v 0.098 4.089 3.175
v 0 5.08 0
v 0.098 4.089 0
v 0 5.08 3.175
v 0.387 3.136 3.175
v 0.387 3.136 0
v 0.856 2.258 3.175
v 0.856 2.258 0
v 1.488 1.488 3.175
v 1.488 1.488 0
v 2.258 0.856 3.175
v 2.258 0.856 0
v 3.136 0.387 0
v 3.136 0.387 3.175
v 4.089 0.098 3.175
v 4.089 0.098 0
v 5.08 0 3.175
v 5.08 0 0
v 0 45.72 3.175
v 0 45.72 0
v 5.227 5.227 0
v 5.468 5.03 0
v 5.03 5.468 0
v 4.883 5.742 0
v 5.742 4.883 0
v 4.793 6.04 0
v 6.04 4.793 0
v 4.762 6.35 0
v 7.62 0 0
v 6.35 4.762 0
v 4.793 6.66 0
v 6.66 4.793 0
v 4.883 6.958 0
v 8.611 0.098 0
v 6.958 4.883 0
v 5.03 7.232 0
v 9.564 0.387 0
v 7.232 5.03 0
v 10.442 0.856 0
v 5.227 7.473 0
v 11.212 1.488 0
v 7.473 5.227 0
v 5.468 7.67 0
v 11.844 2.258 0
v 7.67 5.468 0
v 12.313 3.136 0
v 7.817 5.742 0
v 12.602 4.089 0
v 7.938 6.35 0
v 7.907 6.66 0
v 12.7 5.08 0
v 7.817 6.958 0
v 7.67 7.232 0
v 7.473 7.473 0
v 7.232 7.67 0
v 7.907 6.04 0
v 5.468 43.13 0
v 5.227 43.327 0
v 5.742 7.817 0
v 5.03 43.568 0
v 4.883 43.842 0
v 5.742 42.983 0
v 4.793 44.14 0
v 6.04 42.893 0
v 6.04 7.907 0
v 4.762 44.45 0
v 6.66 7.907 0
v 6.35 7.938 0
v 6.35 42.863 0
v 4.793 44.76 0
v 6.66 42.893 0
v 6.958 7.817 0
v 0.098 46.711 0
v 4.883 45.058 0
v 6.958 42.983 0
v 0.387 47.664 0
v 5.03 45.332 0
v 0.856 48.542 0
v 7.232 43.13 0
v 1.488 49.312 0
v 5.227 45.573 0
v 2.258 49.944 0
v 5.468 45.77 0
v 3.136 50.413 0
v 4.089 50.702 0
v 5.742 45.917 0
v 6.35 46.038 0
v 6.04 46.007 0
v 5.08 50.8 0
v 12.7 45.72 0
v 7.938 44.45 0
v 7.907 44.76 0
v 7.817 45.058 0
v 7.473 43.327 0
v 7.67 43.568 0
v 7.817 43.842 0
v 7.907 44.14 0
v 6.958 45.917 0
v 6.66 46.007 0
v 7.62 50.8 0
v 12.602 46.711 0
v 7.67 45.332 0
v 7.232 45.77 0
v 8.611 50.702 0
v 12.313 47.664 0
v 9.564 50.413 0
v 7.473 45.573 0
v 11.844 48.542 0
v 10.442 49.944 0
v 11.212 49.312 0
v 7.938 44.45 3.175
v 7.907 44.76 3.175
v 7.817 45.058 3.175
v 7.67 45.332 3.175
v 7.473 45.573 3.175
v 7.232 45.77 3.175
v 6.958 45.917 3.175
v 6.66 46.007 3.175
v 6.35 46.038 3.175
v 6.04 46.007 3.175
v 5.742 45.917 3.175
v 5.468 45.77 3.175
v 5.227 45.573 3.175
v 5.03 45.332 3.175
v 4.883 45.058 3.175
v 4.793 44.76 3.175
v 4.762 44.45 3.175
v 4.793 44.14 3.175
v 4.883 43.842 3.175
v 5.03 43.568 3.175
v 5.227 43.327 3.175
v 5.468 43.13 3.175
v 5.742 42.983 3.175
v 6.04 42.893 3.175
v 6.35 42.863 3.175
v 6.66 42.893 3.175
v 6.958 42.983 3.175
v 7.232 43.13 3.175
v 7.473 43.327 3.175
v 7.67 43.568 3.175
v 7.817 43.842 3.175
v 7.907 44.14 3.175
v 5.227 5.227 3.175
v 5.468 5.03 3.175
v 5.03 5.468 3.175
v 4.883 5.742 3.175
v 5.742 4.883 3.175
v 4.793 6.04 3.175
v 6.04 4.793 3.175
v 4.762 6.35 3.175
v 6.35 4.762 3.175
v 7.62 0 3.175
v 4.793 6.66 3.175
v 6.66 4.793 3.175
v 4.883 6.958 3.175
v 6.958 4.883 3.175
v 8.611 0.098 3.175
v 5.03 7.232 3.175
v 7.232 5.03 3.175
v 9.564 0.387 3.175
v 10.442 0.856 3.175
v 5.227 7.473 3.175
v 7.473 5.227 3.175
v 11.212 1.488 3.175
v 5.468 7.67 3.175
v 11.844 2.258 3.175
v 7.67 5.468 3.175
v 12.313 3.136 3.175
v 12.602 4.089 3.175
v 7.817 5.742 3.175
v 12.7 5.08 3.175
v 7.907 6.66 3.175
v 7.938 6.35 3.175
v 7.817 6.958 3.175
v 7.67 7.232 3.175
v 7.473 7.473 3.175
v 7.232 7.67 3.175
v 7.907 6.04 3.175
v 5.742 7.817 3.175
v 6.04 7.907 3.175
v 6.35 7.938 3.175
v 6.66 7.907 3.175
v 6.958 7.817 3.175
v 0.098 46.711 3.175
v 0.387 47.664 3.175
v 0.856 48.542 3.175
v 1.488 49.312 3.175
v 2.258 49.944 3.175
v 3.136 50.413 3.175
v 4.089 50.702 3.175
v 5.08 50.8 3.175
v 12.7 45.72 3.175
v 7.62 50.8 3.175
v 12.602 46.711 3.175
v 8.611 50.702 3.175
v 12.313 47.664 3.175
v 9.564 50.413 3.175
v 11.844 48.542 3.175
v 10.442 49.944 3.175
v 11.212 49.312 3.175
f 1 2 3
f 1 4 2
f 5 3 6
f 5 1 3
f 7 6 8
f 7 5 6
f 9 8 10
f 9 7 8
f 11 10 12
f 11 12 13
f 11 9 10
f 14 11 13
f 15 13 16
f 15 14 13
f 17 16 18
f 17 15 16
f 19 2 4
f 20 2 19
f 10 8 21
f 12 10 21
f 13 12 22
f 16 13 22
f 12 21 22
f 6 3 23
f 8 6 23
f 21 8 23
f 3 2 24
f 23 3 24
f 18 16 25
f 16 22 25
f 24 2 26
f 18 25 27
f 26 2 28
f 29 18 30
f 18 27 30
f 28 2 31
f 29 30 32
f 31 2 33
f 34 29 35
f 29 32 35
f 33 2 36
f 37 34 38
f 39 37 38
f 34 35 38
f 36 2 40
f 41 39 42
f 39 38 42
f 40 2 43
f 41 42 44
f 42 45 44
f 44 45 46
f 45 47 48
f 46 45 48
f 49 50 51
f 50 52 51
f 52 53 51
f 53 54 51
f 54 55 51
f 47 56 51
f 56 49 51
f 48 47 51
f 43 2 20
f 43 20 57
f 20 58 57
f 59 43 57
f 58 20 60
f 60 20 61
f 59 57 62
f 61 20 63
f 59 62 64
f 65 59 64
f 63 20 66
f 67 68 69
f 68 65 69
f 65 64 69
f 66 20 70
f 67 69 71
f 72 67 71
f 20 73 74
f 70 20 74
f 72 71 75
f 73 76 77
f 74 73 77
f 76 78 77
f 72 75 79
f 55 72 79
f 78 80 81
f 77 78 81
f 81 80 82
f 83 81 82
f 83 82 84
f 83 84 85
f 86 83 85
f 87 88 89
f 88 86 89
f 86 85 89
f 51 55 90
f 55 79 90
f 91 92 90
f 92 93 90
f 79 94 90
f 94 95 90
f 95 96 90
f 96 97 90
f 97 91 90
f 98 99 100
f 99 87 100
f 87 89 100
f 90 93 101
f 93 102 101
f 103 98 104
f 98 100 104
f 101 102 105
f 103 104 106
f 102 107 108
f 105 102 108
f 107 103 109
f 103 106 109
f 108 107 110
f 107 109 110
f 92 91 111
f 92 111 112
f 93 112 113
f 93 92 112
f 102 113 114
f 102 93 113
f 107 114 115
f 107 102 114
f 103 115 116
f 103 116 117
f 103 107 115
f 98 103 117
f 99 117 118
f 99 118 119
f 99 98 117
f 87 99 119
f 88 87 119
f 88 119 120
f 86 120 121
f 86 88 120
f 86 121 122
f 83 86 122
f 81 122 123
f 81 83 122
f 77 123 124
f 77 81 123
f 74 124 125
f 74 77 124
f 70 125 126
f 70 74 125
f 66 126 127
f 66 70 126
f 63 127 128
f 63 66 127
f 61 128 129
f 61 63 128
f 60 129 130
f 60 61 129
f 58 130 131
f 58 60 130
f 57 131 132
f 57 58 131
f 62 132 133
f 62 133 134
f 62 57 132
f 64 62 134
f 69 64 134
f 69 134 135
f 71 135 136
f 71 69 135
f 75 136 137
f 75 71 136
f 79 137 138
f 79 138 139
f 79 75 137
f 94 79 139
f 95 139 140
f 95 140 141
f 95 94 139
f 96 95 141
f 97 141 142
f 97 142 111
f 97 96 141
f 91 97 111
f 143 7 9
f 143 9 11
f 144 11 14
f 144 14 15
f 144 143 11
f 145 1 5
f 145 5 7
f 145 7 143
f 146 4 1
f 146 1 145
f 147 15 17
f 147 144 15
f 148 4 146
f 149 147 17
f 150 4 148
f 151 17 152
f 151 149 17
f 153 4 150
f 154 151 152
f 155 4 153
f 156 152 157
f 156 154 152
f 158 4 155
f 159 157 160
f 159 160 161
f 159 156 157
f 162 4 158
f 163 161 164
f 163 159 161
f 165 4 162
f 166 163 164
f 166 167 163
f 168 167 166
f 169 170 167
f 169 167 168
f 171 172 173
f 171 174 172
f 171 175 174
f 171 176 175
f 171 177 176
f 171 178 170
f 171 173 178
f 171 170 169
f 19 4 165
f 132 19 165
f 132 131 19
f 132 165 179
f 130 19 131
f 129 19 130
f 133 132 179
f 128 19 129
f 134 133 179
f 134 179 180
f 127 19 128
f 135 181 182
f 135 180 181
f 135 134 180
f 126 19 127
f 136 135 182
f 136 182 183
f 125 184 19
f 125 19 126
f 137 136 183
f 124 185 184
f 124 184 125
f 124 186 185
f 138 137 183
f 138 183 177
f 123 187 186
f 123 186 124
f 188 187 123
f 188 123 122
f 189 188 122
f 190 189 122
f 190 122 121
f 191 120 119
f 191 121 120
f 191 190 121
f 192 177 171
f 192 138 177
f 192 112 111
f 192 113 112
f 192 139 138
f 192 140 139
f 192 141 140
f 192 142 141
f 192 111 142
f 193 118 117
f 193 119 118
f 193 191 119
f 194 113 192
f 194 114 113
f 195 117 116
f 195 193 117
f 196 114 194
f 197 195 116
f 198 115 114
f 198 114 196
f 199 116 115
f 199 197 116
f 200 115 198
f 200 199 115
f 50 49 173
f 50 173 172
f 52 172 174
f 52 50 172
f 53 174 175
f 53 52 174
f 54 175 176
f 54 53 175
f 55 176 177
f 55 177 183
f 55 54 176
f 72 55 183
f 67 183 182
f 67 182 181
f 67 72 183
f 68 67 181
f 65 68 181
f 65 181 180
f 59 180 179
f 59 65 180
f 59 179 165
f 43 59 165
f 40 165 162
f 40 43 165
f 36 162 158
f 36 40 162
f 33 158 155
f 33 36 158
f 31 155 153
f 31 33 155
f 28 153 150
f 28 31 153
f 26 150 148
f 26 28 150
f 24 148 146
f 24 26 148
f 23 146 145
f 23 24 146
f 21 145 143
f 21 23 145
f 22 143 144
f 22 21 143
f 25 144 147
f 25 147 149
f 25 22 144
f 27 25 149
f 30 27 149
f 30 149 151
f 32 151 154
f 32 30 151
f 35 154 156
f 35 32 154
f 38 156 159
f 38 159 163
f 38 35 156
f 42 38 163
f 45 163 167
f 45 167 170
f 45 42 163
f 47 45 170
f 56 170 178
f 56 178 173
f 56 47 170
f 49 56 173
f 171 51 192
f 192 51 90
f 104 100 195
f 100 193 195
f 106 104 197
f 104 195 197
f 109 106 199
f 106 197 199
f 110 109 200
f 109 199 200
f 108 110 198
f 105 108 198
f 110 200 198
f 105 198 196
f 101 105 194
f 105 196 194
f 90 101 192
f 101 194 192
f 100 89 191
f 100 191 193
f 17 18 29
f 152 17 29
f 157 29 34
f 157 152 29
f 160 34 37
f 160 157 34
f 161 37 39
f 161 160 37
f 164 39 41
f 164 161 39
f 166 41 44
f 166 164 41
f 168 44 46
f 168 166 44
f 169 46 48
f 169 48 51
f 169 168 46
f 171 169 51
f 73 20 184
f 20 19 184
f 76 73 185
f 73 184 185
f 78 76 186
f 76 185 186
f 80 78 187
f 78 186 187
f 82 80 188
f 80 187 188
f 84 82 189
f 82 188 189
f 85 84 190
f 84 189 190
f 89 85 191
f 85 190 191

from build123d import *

# Parameters (mm, degrees)
F0_W     = 12.7
F0_H     = 50.8
F0_R     = 1.5875
F1_DEPTH = 3.175
F2_R     = 5.08


# Not quite as in the source:
# - a length typed as a fraction of an inch, garbled in the dataset ("3 / 203.2 mm" for 3/8 in), is restored


with BuildPart() as f1:
    # F0 (on Top) → F1 (new body)
    with BuildSketch(Plane.XY):
        with Locations((6.35, 25.4)):
            Rectangle(F0_W, F0_H)
        with Locations((6.35, 6.35)):
            Circle(F0_R, mode=Mode.SUBTRACT)
        with Locations((6.35, 44.45)):
            Circle(F0_R, mode=Mode.SUBTRACT)
    extrude(amount=F1_DEPTH)

    # F2
    f2_edges = [f1.edges().sort_by_distance(p)[0] for p in [
        (12.7, 0, 1.5875),
        (0, 0, 1.5875),
        (12.7, 50.8, 1.5875),
        (0, 50.8, 1.5875),
    ]]
    fillet(f2_edges, radius=F2_R)


solid = f1.part
